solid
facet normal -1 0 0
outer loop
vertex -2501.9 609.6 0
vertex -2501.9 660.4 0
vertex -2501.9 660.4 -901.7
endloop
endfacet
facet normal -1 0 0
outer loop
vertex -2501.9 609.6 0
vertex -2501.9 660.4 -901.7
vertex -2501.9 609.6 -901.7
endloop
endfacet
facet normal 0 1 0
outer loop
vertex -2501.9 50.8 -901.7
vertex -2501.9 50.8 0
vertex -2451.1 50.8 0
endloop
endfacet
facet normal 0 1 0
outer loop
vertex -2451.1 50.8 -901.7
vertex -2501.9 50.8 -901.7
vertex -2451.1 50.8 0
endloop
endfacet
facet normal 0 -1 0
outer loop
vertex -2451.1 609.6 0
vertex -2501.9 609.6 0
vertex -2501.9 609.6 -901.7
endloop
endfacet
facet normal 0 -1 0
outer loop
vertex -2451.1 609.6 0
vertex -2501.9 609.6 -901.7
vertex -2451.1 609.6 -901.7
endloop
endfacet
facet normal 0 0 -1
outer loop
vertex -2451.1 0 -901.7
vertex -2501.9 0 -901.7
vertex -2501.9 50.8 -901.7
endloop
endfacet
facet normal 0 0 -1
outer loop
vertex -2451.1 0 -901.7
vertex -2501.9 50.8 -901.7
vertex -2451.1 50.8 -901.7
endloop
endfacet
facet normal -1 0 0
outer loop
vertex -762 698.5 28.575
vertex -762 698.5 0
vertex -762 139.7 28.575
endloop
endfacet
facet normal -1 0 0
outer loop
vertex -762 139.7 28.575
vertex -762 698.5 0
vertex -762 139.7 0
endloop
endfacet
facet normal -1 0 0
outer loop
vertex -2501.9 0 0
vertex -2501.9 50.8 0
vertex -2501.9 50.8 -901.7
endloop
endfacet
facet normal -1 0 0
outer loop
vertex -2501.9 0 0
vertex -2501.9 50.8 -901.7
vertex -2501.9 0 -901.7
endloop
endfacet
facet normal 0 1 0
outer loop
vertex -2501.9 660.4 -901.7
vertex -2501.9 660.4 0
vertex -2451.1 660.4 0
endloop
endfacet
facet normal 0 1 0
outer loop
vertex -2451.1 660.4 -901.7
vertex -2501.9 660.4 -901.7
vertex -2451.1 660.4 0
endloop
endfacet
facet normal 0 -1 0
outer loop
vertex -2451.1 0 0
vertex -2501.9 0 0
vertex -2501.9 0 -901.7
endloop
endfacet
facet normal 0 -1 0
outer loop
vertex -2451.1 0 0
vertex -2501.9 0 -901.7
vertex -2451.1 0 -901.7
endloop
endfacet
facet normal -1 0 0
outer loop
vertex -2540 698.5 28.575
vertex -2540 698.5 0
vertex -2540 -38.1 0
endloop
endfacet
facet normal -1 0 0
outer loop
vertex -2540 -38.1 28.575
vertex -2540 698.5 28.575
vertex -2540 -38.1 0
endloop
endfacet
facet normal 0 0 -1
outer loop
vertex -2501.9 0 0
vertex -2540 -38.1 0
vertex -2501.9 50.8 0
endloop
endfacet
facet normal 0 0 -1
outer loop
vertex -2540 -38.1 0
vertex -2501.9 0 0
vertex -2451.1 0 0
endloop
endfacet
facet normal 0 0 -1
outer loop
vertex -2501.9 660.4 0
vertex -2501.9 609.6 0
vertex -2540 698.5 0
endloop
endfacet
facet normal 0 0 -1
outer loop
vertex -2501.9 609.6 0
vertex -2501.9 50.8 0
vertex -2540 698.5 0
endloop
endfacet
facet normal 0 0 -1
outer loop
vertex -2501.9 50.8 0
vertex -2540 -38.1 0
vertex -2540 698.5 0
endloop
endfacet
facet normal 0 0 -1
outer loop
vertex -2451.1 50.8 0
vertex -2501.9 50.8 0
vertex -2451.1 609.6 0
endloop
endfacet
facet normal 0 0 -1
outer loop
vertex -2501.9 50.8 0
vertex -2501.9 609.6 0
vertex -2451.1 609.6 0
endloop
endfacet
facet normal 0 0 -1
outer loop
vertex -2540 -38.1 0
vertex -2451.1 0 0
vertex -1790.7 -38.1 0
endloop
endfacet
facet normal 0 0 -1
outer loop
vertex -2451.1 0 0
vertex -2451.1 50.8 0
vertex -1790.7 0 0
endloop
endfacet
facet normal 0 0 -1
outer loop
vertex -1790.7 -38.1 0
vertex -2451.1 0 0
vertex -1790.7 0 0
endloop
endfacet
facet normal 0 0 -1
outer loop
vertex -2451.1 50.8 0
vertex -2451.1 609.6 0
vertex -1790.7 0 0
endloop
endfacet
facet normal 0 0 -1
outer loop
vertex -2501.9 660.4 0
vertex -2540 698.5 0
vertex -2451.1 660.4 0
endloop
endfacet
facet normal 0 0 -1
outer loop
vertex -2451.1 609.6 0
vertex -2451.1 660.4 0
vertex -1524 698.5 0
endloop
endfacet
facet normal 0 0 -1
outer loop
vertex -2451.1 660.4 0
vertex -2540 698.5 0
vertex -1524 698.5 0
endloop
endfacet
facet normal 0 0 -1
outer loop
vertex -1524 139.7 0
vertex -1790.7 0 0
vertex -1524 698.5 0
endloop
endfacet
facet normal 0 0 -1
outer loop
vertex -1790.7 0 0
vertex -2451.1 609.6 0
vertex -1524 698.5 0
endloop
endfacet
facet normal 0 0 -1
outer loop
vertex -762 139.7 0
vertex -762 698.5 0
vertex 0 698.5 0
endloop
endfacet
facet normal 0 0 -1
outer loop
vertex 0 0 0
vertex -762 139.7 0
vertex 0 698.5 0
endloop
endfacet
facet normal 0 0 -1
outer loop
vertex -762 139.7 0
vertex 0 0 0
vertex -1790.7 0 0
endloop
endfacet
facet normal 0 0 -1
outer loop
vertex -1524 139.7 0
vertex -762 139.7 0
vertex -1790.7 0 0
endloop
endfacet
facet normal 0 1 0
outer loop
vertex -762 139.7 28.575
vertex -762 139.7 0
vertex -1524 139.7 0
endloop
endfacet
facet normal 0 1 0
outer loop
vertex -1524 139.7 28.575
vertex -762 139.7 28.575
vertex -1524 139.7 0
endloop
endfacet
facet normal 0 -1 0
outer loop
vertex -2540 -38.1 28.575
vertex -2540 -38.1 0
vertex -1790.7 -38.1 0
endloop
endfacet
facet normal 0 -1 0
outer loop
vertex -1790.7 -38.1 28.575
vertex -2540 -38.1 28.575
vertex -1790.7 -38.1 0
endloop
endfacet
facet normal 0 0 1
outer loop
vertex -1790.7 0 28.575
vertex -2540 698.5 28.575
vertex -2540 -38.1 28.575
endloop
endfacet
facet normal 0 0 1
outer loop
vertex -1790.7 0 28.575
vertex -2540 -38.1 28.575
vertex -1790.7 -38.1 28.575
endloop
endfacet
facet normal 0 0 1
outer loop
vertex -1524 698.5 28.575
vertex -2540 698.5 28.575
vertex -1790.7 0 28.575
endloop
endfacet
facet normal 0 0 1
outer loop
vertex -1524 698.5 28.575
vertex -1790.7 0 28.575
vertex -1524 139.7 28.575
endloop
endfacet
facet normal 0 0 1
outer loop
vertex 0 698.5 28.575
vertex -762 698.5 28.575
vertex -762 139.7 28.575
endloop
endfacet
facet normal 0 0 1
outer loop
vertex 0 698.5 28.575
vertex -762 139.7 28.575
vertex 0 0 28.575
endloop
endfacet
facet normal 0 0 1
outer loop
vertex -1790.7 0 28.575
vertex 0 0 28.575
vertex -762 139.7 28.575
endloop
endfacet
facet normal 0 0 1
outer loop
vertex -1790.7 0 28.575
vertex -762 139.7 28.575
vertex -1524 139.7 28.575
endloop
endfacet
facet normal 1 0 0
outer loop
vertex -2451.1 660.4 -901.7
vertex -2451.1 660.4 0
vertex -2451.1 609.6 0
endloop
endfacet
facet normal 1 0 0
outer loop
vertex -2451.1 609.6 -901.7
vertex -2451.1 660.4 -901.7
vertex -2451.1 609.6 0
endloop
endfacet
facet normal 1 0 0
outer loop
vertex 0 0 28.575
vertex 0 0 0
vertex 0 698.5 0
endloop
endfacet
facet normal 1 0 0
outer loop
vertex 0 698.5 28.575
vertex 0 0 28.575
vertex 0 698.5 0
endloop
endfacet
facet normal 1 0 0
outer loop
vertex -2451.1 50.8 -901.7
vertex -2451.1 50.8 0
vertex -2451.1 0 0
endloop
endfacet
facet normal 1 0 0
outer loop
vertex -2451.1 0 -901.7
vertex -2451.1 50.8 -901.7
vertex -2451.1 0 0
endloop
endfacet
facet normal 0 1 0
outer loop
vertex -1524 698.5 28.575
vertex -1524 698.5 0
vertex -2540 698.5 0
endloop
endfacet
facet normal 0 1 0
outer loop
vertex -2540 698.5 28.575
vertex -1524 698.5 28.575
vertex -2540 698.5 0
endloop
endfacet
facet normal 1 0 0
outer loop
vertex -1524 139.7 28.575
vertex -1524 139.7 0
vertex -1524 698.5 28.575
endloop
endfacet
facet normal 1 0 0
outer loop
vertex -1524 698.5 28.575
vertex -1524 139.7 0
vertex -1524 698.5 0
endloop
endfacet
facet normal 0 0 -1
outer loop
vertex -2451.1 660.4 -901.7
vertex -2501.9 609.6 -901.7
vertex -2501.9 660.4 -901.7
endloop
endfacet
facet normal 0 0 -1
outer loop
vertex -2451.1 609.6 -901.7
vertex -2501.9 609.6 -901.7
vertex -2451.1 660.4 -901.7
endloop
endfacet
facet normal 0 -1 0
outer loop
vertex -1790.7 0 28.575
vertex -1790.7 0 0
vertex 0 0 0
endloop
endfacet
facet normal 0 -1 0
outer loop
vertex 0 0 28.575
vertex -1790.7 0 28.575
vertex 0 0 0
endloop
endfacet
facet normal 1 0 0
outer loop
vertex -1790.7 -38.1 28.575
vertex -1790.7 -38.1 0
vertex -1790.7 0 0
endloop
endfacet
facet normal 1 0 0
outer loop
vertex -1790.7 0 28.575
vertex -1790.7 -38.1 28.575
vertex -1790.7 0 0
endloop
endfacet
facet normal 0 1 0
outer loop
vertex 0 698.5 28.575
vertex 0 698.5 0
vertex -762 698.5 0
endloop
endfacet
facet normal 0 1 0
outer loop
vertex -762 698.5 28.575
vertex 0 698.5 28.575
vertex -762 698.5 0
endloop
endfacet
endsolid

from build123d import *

# Parameters (mm, degrees)
F1_DEPTH = 28.575
F2_W     = 50.8
F2_H     = 50.8
F3_DEPTH = 901.7


with BuildPart() as f1:
    # F0 (on Top) → F1 (new body)
    with BuildSketch(Plane.XY):
        Polygon((-1790.7, 0), (0, 0), (0, 698.5), (-762, 698.5), (-762, 139.7), (-1524, 139.7), (-1524, 698.5), (-2540, 698.5), (-2540, 0), (-2540, -38.1), (-1790.7, -38.1), align=None)
    extrude(amount=F1_DEPTH)

    # F2 (on face) → F3 (join)
    with BuildSketch(Plane(origin=(0, 0, 0), x_dir=(1, 0, 0), z_dir=(0, 0, -1))):
        with Locations((-2476.5, -25.4)):
            Rectangle(F2_W, F2_H)
        with Locations((-2476.5, -635)):
            Rectangle(F2_W, F2_H)
    extrude(amount=F3_DEPTH)


solid = f1.part
